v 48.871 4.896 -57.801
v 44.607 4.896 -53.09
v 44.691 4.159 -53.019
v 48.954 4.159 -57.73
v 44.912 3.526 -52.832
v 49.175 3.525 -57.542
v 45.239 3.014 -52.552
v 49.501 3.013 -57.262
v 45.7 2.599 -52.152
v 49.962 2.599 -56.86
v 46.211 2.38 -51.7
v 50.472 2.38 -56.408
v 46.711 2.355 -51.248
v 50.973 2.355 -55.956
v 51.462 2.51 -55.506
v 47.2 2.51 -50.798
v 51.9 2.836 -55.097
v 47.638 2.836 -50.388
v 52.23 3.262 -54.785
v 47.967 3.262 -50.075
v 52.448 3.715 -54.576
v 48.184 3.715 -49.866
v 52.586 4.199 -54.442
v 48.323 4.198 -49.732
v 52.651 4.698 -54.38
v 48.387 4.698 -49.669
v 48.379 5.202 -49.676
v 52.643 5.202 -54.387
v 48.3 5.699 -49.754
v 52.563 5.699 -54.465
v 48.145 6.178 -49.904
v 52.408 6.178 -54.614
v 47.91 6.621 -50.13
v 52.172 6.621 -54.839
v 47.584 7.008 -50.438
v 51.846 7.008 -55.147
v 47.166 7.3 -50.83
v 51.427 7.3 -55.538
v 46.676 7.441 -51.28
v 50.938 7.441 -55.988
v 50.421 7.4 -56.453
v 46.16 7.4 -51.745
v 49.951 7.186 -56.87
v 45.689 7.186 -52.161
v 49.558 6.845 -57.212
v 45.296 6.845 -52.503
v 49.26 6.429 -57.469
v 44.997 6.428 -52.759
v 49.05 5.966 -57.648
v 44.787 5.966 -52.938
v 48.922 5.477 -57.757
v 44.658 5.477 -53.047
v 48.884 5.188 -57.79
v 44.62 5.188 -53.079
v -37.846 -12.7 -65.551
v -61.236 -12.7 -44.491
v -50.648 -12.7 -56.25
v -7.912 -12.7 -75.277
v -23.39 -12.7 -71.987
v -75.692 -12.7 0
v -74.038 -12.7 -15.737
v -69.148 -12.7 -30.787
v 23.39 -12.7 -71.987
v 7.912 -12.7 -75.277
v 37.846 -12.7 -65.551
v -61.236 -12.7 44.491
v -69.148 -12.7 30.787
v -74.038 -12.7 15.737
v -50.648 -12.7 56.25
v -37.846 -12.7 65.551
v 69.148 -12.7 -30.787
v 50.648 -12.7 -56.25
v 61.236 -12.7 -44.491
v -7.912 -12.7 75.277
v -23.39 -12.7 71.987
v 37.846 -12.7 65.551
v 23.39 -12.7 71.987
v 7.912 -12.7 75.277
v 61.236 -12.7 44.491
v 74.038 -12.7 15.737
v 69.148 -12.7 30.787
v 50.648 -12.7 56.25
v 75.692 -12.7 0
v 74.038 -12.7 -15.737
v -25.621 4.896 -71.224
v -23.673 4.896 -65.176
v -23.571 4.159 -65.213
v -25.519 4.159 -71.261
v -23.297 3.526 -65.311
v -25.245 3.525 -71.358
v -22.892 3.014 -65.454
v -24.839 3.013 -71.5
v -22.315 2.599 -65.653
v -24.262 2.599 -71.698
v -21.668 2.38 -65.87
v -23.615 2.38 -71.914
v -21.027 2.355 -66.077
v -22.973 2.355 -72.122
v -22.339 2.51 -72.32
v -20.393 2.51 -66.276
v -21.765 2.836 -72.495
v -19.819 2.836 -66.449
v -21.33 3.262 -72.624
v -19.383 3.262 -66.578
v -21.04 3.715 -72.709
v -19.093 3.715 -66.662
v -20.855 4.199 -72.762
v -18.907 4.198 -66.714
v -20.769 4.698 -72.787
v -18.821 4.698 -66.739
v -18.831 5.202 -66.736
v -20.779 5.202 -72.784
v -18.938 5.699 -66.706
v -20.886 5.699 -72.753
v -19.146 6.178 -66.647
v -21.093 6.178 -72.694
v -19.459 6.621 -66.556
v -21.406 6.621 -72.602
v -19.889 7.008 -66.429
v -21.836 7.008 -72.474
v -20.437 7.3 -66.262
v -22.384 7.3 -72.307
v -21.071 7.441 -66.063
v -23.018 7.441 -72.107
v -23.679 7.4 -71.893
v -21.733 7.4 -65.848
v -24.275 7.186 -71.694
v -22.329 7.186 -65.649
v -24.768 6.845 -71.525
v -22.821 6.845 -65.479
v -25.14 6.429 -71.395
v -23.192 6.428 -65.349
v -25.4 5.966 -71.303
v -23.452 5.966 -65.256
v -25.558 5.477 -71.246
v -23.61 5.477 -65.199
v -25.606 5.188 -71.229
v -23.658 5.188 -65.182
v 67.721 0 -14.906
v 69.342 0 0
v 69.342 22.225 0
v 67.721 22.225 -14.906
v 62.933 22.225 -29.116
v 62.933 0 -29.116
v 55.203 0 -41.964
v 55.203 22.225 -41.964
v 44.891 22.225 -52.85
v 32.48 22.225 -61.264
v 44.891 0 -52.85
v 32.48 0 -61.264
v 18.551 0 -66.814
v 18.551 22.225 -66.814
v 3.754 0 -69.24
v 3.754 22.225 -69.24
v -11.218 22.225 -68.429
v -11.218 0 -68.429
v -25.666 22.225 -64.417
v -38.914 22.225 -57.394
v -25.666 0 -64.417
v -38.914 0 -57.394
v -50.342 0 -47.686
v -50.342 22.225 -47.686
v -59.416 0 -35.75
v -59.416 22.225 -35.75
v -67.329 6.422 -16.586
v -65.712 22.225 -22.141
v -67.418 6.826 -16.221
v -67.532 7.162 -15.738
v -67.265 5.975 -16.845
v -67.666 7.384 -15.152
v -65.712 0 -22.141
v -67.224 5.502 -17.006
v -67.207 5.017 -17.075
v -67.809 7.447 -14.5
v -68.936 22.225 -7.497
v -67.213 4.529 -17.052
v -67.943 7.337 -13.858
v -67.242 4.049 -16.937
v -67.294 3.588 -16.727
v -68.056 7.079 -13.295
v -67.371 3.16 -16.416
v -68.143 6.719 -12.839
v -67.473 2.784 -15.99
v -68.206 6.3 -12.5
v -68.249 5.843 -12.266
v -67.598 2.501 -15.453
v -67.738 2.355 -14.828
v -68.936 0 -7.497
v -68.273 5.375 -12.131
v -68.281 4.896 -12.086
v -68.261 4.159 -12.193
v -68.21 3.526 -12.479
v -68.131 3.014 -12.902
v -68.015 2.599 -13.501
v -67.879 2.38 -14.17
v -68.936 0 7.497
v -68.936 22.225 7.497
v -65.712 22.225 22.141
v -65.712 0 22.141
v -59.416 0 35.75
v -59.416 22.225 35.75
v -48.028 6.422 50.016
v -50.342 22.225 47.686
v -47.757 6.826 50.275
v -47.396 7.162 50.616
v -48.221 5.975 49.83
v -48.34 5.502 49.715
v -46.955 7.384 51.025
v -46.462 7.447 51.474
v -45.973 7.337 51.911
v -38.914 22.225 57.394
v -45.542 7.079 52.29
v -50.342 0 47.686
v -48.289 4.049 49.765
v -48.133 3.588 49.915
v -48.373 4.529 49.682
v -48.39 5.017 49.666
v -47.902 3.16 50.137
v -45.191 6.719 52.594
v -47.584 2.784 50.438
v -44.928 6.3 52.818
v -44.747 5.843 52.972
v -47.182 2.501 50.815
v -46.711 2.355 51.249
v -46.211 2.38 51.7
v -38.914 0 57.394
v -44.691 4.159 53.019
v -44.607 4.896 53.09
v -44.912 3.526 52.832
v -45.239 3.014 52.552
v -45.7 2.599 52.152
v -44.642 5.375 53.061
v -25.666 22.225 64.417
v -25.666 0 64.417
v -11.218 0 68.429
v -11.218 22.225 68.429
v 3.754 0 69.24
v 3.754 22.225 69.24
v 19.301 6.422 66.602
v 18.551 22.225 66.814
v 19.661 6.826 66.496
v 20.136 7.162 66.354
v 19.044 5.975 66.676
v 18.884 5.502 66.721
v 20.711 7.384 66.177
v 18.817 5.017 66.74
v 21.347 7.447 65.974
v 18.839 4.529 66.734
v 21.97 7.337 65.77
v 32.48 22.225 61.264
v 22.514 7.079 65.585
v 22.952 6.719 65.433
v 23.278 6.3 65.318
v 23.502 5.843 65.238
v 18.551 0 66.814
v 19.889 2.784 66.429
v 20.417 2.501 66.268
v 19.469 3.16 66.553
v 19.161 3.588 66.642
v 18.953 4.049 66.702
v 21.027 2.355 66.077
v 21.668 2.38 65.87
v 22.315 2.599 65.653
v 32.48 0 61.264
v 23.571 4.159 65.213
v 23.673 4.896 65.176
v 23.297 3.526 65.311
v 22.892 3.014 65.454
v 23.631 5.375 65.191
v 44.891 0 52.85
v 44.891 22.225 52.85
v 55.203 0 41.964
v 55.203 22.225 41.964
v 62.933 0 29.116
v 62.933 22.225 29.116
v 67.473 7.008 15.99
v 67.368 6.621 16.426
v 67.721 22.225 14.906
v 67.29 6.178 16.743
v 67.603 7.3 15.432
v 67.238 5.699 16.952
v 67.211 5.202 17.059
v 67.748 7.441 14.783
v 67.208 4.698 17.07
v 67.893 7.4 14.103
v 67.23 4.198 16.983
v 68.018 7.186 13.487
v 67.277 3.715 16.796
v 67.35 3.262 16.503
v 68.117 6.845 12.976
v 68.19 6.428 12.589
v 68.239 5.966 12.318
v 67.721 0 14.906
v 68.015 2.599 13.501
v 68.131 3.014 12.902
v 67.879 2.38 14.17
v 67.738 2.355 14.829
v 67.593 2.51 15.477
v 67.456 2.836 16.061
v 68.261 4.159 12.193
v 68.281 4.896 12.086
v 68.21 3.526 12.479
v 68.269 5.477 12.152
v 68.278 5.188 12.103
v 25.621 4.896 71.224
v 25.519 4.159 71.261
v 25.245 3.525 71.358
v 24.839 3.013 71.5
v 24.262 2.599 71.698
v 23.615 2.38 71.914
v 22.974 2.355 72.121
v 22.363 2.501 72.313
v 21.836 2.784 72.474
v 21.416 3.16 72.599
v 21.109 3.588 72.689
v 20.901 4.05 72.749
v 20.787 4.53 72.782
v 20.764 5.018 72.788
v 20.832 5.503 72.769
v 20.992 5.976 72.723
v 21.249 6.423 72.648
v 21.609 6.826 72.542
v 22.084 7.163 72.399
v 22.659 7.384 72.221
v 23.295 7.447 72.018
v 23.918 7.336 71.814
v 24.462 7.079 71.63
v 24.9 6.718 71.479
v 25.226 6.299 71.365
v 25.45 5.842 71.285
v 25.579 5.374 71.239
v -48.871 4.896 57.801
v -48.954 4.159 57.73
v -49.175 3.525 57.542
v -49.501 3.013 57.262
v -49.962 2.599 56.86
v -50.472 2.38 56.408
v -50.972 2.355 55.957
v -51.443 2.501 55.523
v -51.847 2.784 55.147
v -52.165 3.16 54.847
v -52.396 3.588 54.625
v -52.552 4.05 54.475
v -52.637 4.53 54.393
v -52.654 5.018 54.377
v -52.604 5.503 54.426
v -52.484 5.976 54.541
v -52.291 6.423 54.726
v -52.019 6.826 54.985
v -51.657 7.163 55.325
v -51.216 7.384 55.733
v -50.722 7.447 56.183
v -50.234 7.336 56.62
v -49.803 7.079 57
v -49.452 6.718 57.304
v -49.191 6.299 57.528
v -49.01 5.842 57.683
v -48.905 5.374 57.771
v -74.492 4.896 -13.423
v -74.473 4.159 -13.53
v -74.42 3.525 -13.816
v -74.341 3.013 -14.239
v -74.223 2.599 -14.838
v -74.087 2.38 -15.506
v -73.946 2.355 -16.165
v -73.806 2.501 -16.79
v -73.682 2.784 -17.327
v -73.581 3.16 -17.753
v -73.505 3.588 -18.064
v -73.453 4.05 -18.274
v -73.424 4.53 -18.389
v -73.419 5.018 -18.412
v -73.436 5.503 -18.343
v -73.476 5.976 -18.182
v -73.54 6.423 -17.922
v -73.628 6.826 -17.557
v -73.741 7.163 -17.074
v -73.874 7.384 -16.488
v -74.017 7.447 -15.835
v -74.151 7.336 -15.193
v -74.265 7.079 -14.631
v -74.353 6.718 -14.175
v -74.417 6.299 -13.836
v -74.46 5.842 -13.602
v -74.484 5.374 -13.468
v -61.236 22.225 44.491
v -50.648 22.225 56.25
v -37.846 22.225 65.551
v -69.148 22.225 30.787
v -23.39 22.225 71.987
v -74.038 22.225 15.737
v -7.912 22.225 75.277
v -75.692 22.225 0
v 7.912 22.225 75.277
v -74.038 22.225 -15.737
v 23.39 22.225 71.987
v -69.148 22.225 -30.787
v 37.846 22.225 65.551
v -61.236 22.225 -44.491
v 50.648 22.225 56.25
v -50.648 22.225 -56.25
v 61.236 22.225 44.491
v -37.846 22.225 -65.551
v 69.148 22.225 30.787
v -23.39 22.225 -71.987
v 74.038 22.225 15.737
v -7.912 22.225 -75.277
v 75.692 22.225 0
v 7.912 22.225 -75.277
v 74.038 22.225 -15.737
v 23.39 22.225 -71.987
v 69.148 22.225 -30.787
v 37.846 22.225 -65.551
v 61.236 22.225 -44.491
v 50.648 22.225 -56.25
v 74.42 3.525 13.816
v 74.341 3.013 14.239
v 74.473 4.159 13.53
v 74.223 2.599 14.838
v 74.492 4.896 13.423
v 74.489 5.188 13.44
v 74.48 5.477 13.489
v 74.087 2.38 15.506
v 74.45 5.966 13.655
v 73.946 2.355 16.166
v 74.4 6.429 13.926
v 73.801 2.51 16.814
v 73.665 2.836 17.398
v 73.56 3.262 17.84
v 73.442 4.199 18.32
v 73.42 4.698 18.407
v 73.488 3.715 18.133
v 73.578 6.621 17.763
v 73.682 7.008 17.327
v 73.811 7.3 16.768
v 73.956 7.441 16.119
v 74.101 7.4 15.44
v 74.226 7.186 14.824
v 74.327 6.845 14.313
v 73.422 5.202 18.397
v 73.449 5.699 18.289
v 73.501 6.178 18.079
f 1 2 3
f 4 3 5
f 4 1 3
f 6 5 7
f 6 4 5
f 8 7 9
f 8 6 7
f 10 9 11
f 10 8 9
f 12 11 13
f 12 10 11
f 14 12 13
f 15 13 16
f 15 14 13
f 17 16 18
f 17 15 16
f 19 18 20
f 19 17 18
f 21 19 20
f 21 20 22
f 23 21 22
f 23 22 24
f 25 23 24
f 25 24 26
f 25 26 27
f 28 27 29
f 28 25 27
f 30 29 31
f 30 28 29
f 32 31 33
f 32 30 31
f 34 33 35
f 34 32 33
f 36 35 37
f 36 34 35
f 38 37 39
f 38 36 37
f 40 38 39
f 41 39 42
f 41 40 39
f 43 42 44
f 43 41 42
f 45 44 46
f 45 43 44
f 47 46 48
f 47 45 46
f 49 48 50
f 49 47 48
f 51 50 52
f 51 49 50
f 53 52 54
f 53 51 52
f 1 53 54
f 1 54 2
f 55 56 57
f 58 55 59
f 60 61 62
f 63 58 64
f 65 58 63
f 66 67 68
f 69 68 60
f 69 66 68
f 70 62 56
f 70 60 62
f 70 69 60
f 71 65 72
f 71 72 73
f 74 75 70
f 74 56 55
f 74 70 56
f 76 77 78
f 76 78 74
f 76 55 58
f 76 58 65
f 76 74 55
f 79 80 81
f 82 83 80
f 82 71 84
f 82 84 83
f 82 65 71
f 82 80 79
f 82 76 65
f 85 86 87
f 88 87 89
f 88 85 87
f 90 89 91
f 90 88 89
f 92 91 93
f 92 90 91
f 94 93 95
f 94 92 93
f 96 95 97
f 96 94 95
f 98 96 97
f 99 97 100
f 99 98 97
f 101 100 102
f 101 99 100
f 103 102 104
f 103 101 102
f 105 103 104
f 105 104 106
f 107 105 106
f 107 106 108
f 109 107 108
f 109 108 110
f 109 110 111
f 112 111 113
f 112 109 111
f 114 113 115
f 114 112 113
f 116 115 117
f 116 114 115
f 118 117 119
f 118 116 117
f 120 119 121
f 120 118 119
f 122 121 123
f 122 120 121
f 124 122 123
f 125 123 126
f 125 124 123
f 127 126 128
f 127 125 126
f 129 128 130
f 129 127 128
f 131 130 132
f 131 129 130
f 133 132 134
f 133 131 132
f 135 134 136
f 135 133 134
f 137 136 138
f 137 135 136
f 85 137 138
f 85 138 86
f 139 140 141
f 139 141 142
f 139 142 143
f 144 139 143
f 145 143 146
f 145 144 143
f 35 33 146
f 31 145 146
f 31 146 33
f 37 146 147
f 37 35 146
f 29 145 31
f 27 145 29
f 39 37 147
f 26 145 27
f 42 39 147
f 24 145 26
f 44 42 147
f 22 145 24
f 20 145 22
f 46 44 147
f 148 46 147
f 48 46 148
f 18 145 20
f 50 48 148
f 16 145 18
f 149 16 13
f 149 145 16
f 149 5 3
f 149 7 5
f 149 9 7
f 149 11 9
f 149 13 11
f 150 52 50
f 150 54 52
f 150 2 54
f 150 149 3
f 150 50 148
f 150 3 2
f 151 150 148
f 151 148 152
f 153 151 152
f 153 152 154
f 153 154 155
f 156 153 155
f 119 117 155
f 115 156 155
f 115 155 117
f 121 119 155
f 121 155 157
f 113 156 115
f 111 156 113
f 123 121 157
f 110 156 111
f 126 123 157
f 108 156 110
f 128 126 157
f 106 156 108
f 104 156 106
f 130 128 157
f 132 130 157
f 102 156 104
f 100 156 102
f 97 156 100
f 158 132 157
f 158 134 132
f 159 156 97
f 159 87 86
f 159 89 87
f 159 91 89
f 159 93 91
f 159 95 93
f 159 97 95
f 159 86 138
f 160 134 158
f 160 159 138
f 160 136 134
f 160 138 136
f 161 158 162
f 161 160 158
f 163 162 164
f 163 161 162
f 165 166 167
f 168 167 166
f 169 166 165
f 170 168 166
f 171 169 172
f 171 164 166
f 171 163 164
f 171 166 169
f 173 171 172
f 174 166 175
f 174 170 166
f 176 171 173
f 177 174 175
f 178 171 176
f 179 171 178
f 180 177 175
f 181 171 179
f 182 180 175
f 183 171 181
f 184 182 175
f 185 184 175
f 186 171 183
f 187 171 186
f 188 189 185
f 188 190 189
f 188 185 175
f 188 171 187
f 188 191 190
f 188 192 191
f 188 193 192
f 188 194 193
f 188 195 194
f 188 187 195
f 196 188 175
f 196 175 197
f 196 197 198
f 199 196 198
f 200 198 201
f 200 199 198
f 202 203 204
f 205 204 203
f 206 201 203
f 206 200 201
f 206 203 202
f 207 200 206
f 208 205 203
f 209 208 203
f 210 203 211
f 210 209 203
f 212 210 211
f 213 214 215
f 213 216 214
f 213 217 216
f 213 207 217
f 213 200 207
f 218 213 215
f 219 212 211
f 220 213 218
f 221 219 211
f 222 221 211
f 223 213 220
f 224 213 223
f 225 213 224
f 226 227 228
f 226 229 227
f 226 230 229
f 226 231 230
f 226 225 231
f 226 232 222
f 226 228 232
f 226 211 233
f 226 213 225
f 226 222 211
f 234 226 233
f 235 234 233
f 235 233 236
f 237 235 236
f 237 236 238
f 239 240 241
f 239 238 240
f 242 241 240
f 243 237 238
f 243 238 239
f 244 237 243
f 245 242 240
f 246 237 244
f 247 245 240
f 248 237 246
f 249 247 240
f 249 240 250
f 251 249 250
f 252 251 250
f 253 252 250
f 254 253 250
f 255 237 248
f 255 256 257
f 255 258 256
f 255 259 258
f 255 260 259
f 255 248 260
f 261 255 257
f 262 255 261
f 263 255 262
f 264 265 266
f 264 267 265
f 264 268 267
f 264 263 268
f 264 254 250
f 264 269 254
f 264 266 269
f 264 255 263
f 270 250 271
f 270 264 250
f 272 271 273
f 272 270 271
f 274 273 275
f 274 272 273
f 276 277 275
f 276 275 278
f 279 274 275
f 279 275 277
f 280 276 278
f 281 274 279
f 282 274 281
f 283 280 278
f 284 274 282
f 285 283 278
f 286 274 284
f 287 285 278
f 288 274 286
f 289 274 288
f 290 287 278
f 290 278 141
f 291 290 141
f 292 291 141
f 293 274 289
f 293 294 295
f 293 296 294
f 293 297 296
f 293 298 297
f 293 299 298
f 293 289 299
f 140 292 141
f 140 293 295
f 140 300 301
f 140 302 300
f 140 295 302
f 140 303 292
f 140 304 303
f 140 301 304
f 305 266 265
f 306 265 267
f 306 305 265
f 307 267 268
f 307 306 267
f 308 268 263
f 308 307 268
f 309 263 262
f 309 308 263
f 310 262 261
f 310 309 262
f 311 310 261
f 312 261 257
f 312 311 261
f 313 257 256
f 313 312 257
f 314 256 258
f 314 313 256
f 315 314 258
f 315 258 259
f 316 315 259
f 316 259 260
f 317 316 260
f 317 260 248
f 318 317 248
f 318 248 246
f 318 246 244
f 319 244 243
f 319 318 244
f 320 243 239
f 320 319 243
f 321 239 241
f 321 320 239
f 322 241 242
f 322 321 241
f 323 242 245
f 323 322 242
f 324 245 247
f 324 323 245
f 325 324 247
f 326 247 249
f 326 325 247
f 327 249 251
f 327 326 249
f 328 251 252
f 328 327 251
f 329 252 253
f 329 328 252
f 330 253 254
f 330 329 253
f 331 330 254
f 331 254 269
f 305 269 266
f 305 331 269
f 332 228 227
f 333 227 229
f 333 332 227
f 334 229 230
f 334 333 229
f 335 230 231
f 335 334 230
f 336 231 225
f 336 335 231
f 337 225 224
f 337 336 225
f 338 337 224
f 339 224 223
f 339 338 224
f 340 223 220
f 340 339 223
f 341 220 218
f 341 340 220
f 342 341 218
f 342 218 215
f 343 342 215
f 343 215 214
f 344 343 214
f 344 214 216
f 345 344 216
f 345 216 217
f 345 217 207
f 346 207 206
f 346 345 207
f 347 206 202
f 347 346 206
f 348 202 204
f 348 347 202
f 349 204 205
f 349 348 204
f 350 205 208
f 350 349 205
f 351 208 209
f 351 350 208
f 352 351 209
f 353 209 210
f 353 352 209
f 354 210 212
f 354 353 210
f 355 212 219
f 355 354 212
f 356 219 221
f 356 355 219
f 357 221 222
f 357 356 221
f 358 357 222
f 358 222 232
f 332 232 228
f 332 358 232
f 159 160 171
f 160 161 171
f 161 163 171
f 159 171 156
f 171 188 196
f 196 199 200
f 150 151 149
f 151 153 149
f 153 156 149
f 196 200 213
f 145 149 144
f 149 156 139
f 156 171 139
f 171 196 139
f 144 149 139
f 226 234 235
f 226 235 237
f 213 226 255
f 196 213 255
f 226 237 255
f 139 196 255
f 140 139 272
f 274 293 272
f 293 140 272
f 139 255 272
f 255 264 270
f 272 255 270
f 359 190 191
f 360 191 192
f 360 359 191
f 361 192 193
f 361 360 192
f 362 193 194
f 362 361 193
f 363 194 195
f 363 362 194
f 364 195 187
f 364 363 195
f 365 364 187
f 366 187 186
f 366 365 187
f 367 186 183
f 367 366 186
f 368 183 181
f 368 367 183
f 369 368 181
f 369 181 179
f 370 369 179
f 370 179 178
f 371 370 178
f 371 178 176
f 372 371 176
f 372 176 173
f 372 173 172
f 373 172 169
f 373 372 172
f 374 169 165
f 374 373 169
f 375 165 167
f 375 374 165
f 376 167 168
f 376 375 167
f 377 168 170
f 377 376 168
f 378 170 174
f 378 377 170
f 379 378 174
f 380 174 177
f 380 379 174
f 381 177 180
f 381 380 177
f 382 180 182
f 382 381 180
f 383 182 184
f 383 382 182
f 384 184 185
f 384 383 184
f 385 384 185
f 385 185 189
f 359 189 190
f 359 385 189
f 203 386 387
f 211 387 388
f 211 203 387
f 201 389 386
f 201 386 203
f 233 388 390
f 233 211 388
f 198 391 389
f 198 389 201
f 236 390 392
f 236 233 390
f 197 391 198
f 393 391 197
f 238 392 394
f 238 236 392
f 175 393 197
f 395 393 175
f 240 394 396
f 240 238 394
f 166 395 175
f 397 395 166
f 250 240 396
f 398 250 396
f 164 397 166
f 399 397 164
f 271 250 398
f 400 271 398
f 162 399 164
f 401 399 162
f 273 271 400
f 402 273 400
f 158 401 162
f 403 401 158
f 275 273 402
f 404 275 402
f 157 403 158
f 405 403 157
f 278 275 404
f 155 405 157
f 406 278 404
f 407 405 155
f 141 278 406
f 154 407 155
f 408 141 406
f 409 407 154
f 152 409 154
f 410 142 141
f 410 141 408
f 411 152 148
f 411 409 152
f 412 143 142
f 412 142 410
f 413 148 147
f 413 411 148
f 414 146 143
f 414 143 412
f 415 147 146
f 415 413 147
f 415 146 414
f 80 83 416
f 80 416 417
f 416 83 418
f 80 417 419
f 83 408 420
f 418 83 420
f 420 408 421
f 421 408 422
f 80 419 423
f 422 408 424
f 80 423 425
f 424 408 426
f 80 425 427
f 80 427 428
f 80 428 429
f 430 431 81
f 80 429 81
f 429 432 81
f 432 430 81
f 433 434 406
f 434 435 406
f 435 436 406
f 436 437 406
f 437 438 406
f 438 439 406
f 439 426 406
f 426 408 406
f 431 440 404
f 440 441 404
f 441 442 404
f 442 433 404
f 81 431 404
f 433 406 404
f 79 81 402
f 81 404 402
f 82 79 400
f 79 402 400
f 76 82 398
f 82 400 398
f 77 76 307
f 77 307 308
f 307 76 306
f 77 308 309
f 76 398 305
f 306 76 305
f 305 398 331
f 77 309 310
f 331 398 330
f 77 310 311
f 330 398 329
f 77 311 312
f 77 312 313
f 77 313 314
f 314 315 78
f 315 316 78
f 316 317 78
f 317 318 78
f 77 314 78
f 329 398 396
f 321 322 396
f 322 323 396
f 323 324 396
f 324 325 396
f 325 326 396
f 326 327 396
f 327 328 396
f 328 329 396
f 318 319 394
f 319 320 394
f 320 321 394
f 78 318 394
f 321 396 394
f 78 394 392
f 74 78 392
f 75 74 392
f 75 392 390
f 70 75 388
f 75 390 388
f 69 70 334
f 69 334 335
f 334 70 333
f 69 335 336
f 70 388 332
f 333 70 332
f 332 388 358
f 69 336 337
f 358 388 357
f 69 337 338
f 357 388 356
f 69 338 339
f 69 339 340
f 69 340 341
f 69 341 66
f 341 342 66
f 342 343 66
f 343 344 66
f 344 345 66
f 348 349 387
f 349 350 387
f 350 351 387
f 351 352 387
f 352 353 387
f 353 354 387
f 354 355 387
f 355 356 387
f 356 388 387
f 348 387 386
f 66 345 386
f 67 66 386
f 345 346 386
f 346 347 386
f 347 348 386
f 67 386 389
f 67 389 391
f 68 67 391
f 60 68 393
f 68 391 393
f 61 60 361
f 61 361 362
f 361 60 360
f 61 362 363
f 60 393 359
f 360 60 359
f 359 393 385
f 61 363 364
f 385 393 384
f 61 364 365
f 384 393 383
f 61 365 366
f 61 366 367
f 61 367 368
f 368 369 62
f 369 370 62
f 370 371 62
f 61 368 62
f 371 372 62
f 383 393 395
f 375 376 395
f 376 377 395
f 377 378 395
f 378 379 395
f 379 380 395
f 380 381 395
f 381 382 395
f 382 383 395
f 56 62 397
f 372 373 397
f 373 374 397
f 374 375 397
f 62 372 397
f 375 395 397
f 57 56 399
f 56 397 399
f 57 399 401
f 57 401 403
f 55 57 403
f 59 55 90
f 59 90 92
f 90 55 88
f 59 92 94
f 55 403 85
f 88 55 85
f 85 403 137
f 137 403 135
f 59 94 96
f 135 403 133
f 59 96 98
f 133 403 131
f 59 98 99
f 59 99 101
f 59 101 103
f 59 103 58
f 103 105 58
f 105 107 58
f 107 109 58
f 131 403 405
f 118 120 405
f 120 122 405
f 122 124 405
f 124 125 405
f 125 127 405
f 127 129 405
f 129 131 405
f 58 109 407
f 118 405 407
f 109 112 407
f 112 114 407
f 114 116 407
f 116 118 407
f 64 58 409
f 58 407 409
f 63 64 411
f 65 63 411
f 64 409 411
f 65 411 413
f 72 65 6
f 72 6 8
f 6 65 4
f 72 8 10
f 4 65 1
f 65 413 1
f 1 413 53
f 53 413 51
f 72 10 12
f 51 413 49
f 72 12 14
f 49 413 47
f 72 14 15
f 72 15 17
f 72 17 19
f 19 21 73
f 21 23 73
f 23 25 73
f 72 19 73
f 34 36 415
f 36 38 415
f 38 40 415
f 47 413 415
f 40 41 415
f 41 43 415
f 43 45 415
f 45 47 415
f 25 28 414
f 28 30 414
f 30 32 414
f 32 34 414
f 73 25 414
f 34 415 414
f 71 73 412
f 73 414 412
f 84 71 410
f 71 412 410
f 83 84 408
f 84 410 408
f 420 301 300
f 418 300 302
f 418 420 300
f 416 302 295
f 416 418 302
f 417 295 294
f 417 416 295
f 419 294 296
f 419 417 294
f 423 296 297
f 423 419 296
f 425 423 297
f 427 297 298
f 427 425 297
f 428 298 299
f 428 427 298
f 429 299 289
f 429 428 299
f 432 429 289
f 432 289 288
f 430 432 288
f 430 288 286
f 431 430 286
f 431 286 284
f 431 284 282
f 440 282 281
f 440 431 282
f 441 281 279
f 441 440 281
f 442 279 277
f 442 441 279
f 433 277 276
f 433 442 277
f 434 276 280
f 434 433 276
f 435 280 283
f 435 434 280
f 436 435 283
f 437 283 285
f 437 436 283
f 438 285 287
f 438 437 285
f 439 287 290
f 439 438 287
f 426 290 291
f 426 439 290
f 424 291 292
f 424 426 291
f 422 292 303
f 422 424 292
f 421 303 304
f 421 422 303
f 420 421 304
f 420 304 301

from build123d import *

# Parameters (mm, degrees)
SKETCH1_R                            = 75.692
SKETCH1_R_2                          = 69.342
BOSS_EXTRUDE1_DEPTH                  = 22.225
SKETCH2_R                            = 75.692
BOSS_EXTRUDE2_DEPTH                  = 12.7
TAP_DRILL_FOR_1_4_20_TAP1_AT_2_COUNT = 2
TAP_DRILL_FOR_1_4_20_TAP1_AT_2_PITCH = 53.488399339
CIRPATTERN1_COUNT                    = 6


with BuildPart() as part:
    # Sketch1 → Boss-Extrude1 (new body)
    with BuildSketch(Plane(origin=(0, 0, 0), x_dir=(1, 0, 0), z_dir=(0, 1, 0))):
        Circle(SKETCH1_R)
        Circle(SKETCH1_R_2, mode=Mode.SUBTRACT)
    extrude(amount=BOSS_EXTRUDE1_DEPTH)

    # Sketch2 → Boss-Extrude2 (add)
    with BuildSketch(Plane.XZ):
        Circle(SKETCH2_R)
    extrude(amount=BOSS_EXTRUDE2_DEPTH)

    # Sketch4 → Tap Drill for 1/4-20 Tap1 (revolve, cut)
    with BuildSketch(Plane(origin=(73.997176623, 4.896298223, 15.927859738), x_dir=(0.210429897, 0, -0.97760895), z_dir=(0, 1, 0))):
        Polygon((0, 0), (0, 11.185816902), (2.5527, 9.652), (2.5527, 0), align=None)
    tap_drill_for_1_4_20_tap1 = revolve(axis=Axis((80.204993454, 4.896298223, 17.264089582), (-0.97760895, 0, -0.210429897)), mode=Mode.SUBTRACT)

    # Tap Drill for 1/4-20 Tap1 at 2: Tap Drill for 1/4-20 Tap1 ×2
    with Locations(*[Vector(-0.110438581, 0.851210999, 0.51307227) * (i * TAP_DRILL_FOR_1_4_20_TAP1_AT_2_PITCH) for i in range(1, TAP_DRILL_FOR_1_4_20_TAP1_AT_2_COUNT)]):
        add(tap_drill_for_1_4_20_tap1, mode=Mode.SUBTRACT)

    # CirPattern1: Tap Drill for 1/4-20 Tap1 ×6 about axis
    cirpattern1_axis = Axis((0, 22.225, 0), (0, -1, 0))
    for i in range(1, CIRPATTERN1_COUNT):
        add(tap_drill_for_1_4_20_tap1.rotate(cirpattern1_axis, i * 360 / CIRPATTERN1_COUNT), mode=Mode.SUBTRACT)

    # CirPattern1 copy 1 sketch → CirPattern1 copy 1 (revolve, cut)
    with BuildSketch(Plane(origin=(-3.515628412, 50.426212075, 80.653301416), x_dir=(0.951849134, 0, -0.306566839), z_dir=(0, 1, 0))):
        Polygon((0, 0), (0, 11.185816902), (2.5527, 9.652), (2.5527, 0), align=None)
    revolve(axis=Axis((-1.568928987, 50.426212075, 86.697543415), (-0.306566839, 0, -0.951849134)), mode=Mode.SUBTRACT)

    # CirPattern1 copy 2 sketch → CirPattern1 copy 2 (revolve, cut)
    with BuildSketch(Plane(origin=(-71.605622131, 50.426212075, 37.282027193), x_dir=(0.741419237, 0, 0.671042111), z_dir=(0, 1, 0))):
        Polygon((0, 0), (0, 11.185816902), (2.5527, 9.652), (2.5527, 0), align=None)
    revolve(axis=Axis((-75.866739537, 50.426212075, 41.990039348), (0.671042111, 0, -0.741419237)), mode=Mode.SUBTRACT)

    # CirPattern1 copy 3 sketch → CirPattern1 copy 3 (revolve, cut)
    with BuildSketch(Plane(origin=(-68.089993719, 50.426212075, -43.371274223), x_dir=(-0.210429897, 0, 0.97760895), z_dir=(0, 1, 0))):
        Polygon((0, 0), (0, 11.185816902), (2.5527, 9.652), (2.5527, 0), align=None)
    revolve(axis=Axis((-74.29781055, 50.426212075, -44.707504067), (0.97760895, 0, 0.210429897)), mode=Mode.SUBTRACT)

    # CirPattern1 copy 4 sketch → CirPattern1 copy 4 (revolve, cut)
    with BuildSketch(Plane(origin=(3.515628412, 50.426212075, -80.653301416), x_dir=(-0.951849134, 0, 0.306566839), z_dir=(0, 1, 0))):
        Polygon((0, 0), (0, 11.185816902), (2.5527, 9.652), (2.5527, 0), align=None)
    revolve(axis=Axis((1.568928987, 50.426212075, -86.697543415), (0.306566839, 0, 0.951849134)), mode=Mode.SUBTRACT)

    # CirPattern1 copy 5 sketch → CirPattern1 copy 5 (revolve, cut)
    with BuildSketch(Plane(origin=(71.605622131, 50.426212075, -37.282027193), x_dir=(-0.741419237, 0, -0.671042111), z_dir=(0, 1, 0))):
        Polygon((0, 0), (0, 11.185816902), (2.5527, 9.652), (2.5527, 0), align=None)
    revolve(axis=Axis((75.866739537, 50.426212075, -41.990039348), (-0.671042111, 0, 0.741419237)), mode=Mode.SUBTRACT)


solid = part.part
